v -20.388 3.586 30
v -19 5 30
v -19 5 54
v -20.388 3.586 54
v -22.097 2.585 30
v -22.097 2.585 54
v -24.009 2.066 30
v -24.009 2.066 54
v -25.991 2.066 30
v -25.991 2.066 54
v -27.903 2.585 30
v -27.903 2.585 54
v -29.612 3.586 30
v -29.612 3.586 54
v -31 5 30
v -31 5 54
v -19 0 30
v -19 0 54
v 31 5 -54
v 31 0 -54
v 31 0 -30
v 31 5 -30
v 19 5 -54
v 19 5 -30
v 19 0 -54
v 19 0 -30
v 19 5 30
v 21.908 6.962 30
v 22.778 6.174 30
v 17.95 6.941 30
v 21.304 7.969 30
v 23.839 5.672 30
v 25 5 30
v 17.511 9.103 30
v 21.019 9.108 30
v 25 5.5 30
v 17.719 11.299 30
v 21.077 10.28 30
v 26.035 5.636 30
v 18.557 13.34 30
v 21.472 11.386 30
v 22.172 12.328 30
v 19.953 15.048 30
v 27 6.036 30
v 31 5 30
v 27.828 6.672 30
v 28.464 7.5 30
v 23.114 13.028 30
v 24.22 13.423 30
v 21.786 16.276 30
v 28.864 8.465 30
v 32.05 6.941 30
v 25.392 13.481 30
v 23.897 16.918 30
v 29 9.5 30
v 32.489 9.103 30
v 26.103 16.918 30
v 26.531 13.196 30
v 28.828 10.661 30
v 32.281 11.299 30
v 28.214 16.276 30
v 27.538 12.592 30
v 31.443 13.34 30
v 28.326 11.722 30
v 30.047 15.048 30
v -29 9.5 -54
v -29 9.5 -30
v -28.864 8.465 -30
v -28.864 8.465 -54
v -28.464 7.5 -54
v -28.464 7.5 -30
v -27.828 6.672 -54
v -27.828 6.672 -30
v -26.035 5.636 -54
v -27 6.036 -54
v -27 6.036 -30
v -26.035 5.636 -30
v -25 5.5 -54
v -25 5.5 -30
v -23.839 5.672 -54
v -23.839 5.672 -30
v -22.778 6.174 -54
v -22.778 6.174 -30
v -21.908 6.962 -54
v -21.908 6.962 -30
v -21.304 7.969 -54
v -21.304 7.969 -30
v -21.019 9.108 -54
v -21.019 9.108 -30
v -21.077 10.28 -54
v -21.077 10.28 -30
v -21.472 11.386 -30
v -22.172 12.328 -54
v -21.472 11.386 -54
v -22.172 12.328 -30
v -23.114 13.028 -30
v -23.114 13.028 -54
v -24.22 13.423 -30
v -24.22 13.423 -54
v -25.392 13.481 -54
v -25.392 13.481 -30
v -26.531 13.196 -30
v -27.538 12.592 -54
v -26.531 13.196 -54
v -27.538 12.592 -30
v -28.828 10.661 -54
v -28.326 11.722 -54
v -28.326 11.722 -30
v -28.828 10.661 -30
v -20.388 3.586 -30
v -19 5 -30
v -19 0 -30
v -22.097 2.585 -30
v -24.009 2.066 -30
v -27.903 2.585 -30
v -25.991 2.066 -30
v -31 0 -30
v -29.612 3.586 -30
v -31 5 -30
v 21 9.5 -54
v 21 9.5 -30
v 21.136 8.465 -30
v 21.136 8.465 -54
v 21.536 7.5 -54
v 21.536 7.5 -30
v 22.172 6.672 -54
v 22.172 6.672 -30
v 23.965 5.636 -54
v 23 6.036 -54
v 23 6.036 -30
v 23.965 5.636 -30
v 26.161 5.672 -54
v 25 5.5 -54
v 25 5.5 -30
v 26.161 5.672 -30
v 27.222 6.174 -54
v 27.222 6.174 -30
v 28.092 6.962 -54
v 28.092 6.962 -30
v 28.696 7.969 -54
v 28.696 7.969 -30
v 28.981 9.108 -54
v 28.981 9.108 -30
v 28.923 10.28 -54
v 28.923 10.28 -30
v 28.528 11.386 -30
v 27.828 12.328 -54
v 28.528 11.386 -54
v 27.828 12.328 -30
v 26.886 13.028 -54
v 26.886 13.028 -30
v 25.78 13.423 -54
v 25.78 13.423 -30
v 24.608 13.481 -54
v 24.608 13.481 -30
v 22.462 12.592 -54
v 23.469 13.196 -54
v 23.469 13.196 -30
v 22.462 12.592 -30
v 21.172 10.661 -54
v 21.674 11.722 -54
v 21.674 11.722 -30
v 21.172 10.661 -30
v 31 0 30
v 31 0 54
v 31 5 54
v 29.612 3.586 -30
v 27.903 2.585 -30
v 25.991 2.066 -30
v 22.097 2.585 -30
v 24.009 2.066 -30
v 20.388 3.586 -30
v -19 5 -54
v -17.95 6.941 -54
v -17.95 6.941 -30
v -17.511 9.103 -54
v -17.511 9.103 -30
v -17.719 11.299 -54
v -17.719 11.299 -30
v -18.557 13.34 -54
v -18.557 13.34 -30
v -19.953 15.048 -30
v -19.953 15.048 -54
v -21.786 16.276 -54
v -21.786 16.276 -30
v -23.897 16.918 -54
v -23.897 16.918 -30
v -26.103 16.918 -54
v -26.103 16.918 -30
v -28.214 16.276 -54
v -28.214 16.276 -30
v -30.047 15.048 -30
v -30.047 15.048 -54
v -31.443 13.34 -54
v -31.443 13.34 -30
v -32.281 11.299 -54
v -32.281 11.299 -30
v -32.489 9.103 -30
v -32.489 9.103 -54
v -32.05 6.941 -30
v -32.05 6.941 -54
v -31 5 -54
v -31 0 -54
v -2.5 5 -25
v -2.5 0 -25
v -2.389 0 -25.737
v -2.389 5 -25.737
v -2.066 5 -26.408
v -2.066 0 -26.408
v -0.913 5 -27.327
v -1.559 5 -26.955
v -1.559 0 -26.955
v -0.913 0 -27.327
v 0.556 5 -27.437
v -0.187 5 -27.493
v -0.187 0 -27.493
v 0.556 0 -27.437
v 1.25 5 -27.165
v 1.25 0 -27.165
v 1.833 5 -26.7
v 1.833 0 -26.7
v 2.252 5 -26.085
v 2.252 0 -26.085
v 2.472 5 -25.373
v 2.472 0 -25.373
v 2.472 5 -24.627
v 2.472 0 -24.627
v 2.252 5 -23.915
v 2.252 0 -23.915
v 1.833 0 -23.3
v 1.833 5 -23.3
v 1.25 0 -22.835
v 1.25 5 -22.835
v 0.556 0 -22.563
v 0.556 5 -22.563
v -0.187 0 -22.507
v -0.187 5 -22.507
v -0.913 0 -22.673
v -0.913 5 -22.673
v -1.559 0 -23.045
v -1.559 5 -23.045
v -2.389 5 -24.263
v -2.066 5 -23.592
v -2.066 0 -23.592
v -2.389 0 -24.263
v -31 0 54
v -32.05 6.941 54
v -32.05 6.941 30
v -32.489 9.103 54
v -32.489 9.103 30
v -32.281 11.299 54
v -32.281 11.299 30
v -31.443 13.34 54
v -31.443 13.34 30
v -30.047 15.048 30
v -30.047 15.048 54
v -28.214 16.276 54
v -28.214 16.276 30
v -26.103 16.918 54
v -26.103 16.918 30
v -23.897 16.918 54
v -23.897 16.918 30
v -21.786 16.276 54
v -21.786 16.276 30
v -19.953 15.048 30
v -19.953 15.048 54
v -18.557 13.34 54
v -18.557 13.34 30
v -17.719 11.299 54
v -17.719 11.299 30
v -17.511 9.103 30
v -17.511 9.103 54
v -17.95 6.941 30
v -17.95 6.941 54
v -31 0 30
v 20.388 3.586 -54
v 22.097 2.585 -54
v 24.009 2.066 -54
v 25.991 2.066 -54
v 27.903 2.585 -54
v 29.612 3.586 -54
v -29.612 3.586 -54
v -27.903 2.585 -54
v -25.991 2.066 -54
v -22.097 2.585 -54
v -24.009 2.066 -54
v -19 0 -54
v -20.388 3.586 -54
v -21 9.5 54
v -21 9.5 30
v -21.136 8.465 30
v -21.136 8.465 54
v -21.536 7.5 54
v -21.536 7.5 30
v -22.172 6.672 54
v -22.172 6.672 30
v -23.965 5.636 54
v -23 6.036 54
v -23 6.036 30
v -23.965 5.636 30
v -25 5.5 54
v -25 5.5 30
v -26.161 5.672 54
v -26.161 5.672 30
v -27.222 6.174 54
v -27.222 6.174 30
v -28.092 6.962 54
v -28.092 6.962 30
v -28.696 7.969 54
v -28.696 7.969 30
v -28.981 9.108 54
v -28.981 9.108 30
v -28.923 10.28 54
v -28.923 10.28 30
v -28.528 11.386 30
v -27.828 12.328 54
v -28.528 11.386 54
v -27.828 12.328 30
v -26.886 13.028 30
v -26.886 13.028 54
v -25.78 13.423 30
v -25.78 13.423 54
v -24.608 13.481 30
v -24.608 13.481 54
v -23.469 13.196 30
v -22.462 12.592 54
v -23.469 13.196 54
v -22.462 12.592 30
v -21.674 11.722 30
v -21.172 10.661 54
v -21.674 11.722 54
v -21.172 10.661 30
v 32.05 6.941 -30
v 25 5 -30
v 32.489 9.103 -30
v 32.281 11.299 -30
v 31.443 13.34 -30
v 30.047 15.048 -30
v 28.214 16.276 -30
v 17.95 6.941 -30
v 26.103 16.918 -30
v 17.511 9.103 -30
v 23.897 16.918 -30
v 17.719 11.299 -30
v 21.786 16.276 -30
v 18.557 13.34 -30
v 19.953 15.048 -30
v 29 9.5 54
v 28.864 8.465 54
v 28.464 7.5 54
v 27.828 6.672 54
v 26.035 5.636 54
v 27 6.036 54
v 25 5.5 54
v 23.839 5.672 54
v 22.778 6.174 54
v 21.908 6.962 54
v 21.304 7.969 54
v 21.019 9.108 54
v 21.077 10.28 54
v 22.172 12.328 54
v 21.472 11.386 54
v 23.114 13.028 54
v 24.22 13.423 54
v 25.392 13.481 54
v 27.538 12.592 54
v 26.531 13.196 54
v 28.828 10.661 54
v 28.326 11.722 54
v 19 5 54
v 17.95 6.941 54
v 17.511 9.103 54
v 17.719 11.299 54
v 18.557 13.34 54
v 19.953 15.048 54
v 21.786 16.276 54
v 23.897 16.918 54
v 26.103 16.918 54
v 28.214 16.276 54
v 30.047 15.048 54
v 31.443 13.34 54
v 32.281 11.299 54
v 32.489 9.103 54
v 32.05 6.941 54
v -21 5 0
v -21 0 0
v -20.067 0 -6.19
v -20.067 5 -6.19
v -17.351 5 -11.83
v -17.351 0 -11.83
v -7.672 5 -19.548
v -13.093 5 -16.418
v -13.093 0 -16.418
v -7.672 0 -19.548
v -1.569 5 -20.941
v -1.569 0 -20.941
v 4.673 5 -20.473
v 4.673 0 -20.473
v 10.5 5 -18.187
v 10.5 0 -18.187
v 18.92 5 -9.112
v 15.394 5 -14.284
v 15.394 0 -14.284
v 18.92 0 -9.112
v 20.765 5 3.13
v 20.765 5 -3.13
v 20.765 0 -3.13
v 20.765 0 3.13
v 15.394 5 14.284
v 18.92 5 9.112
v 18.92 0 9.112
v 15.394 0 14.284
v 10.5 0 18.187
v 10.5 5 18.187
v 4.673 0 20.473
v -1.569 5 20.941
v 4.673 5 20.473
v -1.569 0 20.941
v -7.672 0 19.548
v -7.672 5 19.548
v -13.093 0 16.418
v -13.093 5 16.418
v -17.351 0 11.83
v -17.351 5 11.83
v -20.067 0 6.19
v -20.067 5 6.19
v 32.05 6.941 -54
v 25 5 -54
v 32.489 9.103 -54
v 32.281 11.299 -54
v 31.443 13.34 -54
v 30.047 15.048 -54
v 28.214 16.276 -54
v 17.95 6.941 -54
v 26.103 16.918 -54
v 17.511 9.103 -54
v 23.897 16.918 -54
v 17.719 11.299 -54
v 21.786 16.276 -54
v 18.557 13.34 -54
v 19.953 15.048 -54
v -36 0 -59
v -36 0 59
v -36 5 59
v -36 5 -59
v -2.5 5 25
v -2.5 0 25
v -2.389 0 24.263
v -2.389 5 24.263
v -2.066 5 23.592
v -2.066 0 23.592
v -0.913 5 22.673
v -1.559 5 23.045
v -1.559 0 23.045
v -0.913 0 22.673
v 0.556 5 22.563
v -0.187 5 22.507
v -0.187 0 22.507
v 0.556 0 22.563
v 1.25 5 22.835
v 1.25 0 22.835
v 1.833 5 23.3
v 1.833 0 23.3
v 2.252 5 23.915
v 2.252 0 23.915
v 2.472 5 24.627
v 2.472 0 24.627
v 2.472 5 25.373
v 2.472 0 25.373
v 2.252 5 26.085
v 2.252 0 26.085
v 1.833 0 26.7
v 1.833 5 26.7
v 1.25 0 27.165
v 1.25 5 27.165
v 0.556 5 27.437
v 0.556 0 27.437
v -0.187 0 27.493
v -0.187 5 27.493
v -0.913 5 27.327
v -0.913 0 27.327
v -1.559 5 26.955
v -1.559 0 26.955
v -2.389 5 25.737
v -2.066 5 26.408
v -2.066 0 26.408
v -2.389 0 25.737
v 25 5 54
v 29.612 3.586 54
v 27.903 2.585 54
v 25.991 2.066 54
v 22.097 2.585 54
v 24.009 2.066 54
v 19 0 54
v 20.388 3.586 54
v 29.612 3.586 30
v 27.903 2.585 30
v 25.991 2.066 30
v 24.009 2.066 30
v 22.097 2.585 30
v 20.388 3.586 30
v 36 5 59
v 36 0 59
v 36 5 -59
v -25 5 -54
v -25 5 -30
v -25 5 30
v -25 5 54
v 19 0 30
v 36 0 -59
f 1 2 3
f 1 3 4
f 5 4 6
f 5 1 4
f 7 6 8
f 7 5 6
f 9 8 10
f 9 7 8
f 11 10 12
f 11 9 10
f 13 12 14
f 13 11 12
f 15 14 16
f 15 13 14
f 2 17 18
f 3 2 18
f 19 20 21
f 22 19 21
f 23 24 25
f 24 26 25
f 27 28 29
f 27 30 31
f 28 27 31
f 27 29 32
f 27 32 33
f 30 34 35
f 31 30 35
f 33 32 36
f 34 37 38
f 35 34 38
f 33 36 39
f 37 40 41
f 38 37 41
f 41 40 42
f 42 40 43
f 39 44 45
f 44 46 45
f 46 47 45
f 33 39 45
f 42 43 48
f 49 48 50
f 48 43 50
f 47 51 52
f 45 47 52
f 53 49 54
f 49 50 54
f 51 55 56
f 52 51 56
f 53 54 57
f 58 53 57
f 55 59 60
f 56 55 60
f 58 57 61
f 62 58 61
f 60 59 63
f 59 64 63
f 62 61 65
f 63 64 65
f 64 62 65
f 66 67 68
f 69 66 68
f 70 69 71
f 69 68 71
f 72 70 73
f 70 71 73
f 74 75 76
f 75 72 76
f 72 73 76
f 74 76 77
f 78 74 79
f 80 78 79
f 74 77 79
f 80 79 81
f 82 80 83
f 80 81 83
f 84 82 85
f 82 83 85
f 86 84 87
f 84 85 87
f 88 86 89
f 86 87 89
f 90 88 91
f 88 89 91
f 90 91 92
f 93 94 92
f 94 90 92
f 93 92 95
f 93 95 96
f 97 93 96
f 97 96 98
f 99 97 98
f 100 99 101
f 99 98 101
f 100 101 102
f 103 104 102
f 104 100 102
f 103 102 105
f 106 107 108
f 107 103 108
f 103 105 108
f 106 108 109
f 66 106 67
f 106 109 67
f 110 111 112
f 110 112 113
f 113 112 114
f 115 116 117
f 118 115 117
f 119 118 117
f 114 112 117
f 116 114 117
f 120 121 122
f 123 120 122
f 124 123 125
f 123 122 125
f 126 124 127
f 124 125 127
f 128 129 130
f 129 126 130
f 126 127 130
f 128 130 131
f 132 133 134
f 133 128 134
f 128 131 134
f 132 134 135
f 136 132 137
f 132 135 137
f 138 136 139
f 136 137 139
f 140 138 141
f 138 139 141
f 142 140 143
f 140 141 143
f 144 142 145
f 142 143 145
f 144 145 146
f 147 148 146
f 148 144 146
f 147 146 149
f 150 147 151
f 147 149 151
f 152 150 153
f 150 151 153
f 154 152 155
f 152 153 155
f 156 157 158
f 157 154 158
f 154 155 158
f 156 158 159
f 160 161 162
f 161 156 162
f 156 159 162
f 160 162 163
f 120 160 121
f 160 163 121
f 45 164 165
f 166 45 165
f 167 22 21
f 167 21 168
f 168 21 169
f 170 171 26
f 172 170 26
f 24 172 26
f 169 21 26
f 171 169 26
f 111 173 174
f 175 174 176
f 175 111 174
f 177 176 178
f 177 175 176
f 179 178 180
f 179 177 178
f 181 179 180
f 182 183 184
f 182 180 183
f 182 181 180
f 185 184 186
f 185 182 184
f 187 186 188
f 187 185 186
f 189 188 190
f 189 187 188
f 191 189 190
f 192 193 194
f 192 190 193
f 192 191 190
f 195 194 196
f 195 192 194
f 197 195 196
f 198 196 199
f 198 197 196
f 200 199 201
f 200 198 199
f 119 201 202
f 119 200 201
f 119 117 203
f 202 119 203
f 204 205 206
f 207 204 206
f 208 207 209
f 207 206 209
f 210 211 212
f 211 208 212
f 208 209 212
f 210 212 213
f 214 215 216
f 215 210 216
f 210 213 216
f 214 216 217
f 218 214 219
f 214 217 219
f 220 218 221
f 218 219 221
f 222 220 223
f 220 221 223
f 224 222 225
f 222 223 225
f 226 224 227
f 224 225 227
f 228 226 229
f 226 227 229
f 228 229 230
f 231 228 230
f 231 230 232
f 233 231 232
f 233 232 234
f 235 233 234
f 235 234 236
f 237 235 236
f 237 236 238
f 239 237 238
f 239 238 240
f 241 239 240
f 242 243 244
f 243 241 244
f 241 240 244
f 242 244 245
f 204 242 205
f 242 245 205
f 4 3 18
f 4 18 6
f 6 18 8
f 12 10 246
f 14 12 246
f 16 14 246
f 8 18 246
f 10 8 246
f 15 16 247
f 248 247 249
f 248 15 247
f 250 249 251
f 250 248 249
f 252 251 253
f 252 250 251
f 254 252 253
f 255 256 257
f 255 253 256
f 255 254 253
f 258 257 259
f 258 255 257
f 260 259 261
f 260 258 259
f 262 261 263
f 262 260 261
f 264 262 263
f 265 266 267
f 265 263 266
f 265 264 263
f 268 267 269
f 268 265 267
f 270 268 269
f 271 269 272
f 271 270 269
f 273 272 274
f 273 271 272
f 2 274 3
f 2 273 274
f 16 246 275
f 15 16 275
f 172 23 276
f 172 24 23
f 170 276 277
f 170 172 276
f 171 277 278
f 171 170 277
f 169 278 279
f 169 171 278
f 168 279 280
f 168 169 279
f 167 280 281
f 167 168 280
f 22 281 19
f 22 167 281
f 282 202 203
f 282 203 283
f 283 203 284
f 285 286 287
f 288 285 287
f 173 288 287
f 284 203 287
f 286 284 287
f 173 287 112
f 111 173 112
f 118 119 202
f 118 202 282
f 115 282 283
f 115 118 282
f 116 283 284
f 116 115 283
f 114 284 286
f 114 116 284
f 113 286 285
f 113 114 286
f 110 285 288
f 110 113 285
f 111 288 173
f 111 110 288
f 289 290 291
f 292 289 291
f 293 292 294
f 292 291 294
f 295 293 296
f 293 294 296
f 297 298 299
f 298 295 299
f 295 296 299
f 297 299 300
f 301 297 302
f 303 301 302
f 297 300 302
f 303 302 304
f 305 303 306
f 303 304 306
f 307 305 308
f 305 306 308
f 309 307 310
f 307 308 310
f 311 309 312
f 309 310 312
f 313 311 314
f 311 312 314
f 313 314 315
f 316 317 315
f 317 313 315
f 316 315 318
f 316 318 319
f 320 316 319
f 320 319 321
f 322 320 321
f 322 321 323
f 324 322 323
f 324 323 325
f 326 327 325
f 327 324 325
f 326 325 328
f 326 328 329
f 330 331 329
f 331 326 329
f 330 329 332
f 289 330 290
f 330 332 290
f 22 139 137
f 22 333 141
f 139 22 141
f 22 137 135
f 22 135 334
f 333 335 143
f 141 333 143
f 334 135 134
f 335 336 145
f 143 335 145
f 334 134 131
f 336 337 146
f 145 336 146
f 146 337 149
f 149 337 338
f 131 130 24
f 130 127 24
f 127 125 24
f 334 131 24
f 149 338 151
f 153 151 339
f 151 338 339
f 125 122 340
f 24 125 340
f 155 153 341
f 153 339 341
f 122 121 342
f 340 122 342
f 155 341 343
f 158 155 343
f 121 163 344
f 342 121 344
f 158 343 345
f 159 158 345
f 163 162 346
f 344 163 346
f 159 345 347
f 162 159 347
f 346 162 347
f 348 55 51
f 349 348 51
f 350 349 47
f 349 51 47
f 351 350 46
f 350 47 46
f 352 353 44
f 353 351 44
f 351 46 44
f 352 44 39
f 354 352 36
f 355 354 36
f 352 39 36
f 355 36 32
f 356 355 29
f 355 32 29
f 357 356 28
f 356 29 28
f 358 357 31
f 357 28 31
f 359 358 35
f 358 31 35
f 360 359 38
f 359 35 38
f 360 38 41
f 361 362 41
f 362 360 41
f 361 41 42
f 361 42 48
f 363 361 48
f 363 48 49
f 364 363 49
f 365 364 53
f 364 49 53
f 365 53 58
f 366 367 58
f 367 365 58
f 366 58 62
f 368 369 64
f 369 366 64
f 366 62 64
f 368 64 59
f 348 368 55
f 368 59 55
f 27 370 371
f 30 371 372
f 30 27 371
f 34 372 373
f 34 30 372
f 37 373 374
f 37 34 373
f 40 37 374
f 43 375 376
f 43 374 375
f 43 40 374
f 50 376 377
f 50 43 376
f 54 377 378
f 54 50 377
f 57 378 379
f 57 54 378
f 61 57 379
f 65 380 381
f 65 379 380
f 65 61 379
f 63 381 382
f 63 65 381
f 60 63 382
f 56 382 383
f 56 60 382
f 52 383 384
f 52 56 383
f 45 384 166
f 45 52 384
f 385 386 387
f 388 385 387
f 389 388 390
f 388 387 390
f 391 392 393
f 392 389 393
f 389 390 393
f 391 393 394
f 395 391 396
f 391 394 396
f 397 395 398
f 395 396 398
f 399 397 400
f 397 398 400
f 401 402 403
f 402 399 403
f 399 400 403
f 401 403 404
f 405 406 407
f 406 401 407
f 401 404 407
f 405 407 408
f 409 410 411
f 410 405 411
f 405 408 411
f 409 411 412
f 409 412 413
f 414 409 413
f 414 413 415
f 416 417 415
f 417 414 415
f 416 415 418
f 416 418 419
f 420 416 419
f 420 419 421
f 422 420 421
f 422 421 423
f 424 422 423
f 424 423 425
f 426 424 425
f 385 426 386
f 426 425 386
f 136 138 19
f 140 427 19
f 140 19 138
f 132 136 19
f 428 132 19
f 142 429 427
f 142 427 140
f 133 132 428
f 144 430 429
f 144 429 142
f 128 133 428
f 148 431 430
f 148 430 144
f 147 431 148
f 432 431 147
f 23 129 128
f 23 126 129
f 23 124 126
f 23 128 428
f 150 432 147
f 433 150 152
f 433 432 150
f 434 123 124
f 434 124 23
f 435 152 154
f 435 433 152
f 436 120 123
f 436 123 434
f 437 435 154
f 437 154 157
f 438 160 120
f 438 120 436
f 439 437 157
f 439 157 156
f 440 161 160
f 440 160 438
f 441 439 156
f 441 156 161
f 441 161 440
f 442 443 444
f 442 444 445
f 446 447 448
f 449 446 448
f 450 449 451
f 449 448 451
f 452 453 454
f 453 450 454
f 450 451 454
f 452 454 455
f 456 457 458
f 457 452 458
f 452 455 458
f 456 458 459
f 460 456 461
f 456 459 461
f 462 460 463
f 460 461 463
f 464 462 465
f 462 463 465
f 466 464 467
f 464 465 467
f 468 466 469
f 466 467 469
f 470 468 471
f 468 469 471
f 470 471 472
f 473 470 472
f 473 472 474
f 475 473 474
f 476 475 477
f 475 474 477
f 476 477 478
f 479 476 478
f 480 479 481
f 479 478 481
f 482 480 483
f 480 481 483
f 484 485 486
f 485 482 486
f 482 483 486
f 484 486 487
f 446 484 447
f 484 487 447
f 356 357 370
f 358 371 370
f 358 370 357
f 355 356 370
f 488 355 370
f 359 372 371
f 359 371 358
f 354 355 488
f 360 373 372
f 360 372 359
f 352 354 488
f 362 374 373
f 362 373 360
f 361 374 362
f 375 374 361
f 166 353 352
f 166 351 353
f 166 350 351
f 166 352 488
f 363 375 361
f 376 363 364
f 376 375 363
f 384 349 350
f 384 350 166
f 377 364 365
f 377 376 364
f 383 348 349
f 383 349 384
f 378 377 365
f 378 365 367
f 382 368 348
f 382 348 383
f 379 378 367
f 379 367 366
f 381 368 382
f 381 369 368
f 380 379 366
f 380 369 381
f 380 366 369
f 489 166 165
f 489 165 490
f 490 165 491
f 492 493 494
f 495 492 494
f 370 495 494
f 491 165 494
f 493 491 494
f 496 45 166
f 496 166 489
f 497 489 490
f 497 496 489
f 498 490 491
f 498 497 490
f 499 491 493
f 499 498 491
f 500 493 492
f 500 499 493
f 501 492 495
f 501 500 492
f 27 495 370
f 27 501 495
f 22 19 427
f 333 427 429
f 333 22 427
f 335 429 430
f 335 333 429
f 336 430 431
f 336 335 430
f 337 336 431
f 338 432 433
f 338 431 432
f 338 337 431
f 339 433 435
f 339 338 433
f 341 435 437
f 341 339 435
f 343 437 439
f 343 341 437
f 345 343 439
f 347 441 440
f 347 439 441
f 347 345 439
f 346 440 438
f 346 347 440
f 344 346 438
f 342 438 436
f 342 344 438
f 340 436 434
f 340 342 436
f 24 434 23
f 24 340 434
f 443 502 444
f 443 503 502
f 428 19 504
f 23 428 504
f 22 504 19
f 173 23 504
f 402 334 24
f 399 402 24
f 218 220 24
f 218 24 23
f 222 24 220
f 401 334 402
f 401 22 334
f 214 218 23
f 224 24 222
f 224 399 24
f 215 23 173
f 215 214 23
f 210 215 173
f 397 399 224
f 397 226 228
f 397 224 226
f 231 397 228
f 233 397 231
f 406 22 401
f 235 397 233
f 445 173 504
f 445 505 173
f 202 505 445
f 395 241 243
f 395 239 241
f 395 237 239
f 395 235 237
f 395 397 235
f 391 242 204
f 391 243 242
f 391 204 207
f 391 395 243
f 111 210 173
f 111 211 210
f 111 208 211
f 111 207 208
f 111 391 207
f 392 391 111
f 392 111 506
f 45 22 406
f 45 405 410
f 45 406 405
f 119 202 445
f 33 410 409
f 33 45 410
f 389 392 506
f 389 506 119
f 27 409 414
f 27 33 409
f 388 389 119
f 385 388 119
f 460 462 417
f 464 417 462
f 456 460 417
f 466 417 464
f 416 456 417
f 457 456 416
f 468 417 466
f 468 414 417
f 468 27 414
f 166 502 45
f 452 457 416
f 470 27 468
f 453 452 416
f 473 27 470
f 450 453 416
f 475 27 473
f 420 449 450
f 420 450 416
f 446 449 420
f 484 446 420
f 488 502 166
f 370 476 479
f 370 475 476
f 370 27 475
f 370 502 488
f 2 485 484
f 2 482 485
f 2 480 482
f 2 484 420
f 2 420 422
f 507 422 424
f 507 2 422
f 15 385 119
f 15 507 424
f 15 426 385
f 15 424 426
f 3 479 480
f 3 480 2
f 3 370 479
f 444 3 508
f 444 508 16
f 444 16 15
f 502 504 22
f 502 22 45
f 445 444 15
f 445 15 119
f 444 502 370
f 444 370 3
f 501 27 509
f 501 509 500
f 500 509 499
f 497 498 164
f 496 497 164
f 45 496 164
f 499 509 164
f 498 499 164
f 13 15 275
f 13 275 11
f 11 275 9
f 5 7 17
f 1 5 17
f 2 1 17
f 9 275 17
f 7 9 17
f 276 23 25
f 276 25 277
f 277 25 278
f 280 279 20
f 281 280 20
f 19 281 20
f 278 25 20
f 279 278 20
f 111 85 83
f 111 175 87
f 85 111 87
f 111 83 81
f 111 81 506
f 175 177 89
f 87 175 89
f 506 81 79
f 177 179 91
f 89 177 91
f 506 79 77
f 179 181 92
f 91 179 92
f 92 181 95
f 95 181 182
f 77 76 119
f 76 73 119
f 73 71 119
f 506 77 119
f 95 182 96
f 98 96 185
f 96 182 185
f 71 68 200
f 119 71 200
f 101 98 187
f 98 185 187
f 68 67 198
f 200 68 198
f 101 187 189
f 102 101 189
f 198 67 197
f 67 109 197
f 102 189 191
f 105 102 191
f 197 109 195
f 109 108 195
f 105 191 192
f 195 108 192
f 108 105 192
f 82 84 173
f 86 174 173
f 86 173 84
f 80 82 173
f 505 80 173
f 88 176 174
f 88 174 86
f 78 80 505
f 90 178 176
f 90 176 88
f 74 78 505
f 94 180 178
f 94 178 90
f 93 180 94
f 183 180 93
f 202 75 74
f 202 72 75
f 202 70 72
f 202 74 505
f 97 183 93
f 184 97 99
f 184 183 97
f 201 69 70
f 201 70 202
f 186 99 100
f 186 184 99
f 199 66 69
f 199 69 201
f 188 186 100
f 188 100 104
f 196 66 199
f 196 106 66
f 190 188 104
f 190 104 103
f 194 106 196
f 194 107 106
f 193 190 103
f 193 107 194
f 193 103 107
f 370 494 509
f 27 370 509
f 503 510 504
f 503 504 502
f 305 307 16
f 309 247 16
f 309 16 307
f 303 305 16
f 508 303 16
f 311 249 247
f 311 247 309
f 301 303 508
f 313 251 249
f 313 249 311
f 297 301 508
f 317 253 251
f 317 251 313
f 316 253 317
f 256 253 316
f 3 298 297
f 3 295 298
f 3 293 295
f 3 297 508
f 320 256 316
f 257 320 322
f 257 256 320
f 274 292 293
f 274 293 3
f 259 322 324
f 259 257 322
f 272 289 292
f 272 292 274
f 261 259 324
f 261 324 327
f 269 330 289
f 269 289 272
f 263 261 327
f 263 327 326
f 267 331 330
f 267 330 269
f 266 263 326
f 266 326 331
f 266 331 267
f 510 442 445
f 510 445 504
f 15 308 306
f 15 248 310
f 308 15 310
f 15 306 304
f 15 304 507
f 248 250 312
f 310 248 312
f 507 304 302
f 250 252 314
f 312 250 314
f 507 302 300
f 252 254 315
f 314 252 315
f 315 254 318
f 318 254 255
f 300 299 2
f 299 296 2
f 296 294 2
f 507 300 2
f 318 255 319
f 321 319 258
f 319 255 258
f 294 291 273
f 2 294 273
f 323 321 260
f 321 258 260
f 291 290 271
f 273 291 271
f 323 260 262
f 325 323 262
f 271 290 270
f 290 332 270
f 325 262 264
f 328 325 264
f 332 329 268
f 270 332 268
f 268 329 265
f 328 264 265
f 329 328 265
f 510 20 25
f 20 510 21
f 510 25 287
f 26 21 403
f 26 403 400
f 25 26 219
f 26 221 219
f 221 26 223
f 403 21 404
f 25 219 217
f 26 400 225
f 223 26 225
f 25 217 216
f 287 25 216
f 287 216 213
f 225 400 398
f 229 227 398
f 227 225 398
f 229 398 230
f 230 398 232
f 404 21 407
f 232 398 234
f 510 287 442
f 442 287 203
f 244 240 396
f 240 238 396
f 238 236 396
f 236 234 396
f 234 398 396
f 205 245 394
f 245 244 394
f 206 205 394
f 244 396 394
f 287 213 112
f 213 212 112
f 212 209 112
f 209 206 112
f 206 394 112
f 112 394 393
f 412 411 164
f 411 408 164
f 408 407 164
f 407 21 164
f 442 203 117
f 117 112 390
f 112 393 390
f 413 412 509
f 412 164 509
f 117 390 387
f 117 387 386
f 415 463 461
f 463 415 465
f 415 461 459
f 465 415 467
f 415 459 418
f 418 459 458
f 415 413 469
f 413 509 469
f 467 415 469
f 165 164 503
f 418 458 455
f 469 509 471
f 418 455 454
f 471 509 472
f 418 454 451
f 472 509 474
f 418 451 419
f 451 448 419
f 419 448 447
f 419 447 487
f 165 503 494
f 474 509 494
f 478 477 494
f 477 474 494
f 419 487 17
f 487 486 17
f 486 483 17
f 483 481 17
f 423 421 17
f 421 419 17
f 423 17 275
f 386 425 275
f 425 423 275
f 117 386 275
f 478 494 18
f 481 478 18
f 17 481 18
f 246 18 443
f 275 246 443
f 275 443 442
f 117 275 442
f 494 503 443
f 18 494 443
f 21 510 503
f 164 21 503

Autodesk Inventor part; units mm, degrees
ref_plane "YZ Plane" through (0, 0, 0) normal (1, 0, 0) x (0, 1, 0)
ref_plane "XZ Plane" through (0, 0, 0) normal (0, 1, 0) x (-1, 0, 0)
ref_plane "XY Plane" through (0, 0, 0) normal (0, 0, 1) x (1, 0, 0)
sketch "Sketch1" plane through (0, 0, 0) normal (0, 1, 0) x (-1, 0, 0)
  circle A0 centre (0, 0) radius 21
  circle A1 centre (0, 25) radius 2.5
  circle A2 centre (0, -25) radius 2.5
  line L0 (-31, 54) -> (-19, 54)
  line L1 (-19, 54) -> (-19, 30)
  line L2 (-19, 30) -> (-31, 30)
  line L3 (-31, 30) -> (-31, 54)
  line L4 (19, 54) -> (31, 54)
  line L5 (31, 54) -> (31, 30)
  line L6 (31, 30) -> (19, 30)
  line L7 (19, 30) -> (19, 54)
  line L8 (-31, -30) -> (-19, -30)
  line L9 (-19, -30) -> (-19, -54)
  line L10 (-19, -54) -> (-31, -54)
  line L11 (-31, -54) -> (-31, -30)
  line L12 (19, -30) -> (31, -30)
  line L13 (31, -30) -> (31, -54)
  line L14 (31, -54) -> (19, -54)
  line L15 (19, -54) -> (19, -30)
  line L16 (-36, 59) -> (36, 59)
  line L17 (36, 59) -> (36, -59)
  line L18 (36, -59) -> (-36, -59)
  line L19 (-36, -59) -> (-36, 59)
  dimension "d2" = 5
  dimension "d4" = 5
  dimension "d9" = 12
  dimension "d10" = 24
  dimension "d11" = 12
  dimension "d12" = 24
  dimension "d13" = 12
  dimension "d14" = 24
  dimension "d15" = 12
  dimension "d16" = 24
extrude "Extrusion1" add sketch "Sketch1" along normal blind 5
sketch "Sketch2" plane through (19, 0, 30) normal (0, 0, 1) x (1, 0, 0)
  line L0 (0, 5) -> (12, 5) projected
  line L1 (0, 0) -> (0, 5) projected
  line L2 (6, 5) -> (6, 9.5)
  circle A0 centre (6, 9.5) radius 7.5
  circle A1 centre (6, 9.5) radius 4
  point P0 (-19, 0)
  dimension "d23" = 4.5
  dimension "d24" = 15
  dimension "d25" = 8
extrude "Extrusion2" add sketch "Sketch2" along normal blind 24
sketch "Sketch3" plane through (-31, 0, 30) normal (0, 0, 1) x (1, 0, 0)
  line L0 (0, 5) -> (12, 5) projected
  line L1 (0, 0) -> (0, 5) projected
  line L2 (6, 5) -> (6, 9.5)
  circle A0 centre (6, 9.5) radius 7.5
  circle A1 centre (6, 9.5) radius 4
  point P0 (31, 0)
  dimension "d28" = 4.5
  dimension "d29" = 15
  dimension "d30" = 8
extrude "Extrusion3" add sketch "Sketch3" along normal blind 24
sketch "Sketch4" plane through (-19, 0, -30) normal (0, 0, -1) x (-1, 0, 0)
  line L0 (0, 5) -> (12, 5) projected
  line L1 (0, 0) -> (0, 5) projected
  line L2 (6, 5) -> (6, 9.5)
  circle A0 centre (6, 9.5) radius 7.5
  circle A1 centre (6, 9.5) radius 4
  point P0 (-19, 0)
  dimension "d33" = 4.5
  dimension "d34" = 15
  dimension "d35" = 8
extrude "Extrusion4" add sketch "Sketch4" along normal blind 24
sketch "Sketch5" plane through (31, 0, -30) normal (0, 0, -1) x (-1, 0, 0)
  line L0 (0, 5) -> (12, 5) projected
  line L1 (0, 0) -> (0, 5) projected
  line L2 (6, 5) -> (6, 9.5)
  circle A0 centre (6, 9.5) radius 7.5
  circle A1 centre (6, 9.5) radius 4
  point P0 (31, 0)
  dimension "d38" = 4.5
  dimension "d39" = 15
  dimension "d40" = 8
extrude "Extrusion5" add sketch "Sketch5" along normal blind 24
properties part number "X_Carriage_V1" material "Ash"
